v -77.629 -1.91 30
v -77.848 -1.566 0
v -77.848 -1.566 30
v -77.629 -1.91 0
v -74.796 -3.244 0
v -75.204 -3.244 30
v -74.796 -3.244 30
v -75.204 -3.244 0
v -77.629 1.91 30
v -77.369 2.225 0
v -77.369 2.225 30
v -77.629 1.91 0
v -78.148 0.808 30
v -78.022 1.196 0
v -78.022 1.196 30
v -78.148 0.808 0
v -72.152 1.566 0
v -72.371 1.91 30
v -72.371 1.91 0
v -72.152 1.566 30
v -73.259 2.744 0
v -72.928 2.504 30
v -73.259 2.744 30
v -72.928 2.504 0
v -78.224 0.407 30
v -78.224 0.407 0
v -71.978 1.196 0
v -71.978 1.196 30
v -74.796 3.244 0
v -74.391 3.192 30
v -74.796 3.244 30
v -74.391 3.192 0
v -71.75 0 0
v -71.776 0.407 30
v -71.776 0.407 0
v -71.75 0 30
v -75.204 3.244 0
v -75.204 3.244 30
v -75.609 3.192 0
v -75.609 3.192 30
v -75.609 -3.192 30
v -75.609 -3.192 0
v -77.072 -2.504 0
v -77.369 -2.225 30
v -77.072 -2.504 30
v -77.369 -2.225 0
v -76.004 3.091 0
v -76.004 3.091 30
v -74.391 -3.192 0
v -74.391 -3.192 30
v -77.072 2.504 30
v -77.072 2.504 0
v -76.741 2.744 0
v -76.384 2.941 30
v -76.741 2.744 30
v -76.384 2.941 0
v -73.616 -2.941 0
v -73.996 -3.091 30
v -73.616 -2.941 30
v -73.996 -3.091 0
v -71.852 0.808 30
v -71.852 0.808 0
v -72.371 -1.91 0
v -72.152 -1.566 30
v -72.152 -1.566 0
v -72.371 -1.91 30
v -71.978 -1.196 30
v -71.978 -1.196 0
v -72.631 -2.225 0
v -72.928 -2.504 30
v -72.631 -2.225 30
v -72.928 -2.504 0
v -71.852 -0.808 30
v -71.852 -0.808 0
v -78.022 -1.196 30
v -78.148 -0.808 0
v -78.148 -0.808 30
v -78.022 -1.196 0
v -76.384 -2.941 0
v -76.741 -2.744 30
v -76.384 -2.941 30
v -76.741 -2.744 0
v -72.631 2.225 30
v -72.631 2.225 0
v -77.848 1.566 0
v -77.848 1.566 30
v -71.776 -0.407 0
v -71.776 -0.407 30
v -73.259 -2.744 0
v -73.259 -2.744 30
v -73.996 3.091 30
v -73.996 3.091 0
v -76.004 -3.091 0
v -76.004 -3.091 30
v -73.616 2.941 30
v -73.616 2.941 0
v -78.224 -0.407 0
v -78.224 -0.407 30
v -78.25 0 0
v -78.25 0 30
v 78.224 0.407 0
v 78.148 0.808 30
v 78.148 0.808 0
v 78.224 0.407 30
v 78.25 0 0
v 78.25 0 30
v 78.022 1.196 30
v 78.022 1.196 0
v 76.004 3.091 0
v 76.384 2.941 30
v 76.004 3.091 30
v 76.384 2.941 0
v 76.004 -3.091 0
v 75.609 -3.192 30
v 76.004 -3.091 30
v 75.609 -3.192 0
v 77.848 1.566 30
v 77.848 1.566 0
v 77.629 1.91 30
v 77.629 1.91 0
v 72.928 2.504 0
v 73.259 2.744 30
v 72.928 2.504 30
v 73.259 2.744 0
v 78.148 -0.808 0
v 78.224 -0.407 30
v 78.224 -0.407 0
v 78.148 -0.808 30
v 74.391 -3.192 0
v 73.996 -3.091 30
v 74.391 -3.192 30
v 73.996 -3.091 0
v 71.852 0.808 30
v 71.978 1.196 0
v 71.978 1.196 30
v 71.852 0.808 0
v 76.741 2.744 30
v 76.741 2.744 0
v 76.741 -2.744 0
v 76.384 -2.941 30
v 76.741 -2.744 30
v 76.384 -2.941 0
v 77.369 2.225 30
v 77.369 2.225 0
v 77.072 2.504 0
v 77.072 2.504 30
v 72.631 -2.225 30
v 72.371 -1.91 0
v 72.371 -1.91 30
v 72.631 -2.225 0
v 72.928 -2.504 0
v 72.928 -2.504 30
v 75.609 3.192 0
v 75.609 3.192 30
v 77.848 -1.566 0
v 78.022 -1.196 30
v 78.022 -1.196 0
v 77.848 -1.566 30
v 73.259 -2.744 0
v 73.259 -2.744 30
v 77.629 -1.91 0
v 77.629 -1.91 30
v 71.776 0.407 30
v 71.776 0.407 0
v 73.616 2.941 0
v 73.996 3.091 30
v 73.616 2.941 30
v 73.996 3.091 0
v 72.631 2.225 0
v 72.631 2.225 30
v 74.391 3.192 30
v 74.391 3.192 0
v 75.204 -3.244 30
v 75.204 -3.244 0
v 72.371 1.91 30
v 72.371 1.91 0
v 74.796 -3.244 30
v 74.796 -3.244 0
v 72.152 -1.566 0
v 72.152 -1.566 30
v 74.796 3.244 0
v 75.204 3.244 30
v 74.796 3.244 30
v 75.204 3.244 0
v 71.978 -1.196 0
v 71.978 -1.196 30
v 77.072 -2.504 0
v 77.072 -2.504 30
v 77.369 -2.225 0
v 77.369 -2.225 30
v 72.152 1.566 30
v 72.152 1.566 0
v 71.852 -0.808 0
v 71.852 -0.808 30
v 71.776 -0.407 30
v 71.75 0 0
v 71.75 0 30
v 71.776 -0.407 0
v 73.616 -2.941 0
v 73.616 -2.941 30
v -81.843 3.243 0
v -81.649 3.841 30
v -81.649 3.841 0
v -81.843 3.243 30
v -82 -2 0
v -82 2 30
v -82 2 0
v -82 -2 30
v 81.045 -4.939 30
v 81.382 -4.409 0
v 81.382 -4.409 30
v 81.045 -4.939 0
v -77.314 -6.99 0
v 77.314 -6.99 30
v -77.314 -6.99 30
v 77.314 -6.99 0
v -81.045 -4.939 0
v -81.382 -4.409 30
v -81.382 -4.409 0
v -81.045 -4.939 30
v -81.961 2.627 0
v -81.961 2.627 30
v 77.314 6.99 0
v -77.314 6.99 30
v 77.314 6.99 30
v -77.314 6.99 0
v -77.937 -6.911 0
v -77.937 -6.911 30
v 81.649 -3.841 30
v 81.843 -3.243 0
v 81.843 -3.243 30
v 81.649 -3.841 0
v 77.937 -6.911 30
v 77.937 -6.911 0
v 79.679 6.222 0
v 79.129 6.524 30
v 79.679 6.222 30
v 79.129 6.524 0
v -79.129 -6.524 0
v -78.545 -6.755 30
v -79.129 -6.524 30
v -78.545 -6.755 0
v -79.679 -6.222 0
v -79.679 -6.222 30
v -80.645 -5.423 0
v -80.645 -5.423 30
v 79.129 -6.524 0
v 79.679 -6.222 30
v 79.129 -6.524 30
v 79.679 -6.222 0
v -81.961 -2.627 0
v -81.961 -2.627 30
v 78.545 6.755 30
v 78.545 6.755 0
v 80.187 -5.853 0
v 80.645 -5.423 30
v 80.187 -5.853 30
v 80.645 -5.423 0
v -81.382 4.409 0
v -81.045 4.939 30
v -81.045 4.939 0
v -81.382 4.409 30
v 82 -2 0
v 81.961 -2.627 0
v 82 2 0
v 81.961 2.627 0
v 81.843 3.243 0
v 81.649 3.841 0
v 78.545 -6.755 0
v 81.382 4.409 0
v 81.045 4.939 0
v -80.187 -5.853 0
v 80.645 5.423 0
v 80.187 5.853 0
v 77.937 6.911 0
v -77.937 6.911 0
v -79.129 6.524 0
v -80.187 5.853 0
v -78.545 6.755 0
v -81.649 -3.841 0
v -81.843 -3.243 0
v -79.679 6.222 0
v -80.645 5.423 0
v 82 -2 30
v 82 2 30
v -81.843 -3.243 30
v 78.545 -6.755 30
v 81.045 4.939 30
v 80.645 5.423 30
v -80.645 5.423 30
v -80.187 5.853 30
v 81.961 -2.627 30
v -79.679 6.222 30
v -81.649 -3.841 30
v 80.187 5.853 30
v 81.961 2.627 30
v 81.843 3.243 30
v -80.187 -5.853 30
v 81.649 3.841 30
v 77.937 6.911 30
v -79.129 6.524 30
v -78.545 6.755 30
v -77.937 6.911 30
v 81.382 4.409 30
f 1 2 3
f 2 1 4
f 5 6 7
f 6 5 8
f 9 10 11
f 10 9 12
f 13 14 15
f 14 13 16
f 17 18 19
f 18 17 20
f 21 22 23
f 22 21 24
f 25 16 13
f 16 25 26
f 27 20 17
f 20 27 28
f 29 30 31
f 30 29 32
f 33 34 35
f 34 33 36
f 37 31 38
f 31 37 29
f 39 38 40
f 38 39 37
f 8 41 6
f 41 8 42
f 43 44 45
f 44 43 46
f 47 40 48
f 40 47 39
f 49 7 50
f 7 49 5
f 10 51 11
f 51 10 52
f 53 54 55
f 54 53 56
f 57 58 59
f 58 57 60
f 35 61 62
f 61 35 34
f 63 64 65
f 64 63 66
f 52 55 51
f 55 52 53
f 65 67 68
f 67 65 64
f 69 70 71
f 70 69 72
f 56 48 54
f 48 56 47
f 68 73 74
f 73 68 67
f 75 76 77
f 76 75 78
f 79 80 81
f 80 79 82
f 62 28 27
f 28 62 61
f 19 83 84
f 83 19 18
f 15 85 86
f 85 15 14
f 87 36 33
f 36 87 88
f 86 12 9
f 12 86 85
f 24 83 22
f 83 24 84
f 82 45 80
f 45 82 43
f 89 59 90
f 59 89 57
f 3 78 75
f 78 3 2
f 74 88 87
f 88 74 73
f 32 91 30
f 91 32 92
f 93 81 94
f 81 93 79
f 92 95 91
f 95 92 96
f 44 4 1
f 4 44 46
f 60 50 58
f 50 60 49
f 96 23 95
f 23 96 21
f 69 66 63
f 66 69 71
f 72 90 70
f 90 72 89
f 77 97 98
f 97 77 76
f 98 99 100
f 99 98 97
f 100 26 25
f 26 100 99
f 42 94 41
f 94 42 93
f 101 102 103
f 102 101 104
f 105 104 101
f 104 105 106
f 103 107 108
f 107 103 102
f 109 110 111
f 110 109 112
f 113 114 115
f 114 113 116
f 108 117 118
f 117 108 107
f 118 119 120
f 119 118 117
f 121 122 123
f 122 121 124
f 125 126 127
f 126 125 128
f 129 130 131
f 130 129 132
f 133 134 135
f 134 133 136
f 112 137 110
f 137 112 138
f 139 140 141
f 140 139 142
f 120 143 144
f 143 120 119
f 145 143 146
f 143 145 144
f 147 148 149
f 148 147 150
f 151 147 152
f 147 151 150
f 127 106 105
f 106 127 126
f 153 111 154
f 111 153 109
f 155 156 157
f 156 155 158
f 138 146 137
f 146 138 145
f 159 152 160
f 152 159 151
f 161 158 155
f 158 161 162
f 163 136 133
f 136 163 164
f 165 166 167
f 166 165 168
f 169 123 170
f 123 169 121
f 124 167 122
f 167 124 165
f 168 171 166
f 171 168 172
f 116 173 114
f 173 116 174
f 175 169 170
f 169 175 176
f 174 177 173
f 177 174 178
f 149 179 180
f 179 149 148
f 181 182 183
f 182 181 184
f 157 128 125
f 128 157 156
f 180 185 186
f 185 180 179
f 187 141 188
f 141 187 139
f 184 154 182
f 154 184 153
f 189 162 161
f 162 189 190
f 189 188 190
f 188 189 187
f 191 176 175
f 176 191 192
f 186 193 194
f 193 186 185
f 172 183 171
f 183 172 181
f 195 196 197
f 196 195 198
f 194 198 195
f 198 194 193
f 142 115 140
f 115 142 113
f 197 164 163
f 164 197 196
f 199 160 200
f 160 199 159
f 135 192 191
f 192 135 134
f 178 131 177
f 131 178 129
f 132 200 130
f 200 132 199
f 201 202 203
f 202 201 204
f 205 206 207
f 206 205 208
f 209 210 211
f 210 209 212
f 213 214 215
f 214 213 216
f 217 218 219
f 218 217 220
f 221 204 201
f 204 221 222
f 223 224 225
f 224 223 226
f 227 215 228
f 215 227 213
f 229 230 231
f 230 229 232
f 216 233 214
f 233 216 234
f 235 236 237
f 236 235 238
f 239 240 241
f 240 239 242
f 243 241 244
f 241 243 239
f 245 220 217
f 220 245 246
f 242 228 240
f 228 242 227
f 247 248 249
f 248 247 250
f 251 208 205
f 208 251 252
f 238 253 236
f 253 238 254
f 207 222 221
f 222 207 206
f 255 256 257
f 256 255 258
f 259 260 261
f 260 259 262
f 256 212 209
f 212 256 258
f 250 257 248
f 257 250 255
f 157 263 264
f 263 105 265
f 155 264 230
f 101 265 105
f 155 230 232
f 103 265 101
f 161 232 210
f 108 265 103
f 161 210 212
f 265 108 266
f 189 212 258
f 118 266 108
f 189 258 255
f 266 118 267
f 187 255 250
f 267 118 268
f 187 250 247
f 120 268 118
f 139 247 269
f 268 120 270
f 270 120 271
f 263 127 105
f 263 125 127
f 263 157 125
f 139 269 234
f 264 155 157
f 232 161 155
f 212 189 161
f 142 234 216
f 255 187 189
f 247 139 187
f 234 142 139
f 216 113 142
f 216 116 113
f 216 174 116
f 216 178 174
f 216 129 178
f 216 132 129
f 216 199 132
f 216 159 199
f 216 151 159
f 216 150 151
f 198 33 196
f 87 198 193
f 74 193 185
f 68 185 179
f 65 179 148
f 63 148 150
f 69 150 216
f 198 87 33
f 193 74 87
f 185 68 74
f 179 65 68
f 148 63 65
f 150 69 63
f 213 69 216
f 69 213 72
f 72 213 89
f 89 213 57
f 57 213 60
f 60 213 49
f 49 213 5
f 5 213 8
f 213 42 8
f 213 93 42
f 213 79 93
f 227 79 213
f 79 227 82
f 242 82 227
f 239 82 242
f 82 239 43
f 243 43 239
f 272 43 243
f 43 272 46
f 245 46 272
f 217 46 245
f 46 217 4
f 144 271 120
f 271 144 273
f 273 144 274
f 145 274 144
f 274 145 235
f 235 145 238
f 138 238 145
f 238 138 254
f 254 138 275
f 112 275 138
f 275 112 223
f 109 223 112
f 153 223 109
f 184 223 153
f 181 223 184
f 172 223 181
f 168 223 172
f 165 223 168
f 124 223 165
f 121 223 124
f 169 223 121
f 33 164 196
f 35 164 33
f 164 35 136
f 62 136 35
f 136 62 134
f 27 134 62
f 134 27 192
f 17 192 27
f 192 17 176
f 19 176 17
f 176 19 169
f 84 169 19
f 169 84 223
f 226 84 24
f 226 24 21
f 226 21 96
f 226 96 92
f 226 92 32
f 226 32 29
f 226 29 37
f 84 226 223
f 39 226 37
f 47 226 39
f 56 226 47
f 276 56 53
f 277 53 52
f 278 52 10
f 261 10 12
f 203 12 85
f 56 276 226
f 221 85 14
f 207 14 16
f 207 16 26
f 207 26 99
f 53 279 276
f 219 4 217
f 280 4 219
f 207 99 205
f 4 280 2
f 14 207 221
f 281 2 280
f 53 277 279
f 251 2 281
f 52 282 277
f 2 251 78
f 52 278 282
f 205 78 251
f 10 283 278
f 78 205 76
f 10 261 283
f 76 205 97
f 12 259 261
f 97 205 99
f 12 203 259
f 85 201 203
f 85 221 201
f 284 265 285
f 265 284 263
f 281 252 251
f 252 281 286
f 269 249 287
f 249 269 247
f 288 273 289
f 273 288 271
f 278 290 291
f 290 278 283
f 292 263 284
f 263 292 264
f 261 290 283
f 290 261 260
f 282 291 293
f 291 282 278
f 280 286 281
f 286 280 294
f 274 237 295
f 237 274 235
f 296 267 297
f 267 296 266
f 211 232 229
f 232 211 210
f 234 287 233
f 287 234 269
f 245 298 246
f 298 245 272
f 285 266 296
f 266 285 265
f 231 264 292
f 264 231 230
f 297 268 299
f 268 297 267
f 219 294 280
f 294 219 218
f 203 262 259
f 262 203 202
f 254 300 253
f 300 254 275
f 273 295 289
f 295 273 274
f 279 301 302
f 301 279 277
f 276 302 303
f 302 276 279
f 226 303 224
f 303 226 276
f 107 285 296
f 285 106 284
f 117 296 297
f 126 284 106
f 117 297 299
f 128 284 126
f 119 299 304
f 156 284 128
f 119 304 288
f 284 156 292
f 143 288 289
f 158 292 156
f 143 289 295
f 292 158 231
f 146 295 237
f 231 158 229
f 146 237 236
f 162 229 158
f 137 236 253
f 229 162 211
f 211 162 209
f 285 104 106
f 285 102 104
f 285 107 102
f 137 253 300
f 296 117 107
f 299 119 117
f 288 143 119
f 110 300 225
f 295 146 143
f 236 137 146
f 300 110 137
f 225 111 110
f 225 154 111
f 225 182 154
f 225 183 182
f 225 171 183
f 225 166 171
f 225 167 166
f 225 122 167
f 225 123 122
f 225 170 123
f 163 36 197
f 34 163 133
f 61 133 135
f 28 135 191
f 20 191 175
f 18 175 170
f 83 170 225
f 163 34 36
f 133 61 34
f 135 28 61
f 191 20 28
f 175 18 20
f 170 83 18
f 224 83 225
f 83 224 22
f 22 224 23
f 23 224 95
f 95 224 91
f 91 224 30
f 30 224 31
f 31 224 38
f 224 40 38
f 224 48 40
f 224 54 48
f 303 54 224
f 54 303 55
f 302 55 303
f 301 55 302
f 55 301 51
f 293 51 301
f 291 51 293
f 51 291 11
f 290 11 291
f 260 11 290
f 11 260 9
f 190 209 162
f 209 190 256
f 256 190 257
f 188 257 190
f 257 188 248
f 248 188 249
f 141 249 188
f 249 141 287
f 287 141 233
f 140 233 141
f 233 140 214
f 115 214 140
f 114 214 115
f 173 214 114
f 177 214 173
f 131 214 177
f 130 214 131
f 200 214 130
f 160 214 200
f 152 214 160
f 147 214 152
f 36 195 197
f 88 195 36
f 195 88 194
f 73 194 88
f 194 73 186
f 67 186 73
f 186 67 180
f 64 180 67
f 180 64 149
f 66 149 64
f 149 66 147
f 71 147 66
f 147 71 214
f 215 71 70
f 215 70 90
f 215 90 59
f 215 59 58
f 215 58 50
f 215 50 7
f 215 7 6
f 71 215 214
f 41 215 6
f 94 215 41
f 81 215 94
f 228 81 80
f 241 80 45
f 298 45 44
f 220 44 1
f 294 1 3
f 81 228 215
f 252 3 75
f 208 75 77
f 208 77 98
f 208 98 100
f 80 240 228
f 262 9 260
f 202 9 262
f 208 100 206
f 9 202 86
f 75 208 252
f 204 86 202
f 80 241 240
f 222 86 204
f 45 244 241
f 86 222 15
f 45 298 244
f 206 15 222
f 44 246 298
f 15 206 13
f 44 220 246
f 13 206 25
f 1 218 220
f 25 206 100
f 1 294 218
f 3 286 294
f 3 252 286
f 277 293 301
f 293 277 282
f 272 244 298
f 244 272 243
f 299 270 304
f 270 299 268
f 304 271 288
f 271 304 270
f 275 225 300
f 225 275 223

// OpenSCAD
$fn = 50;


difference() {
	union() {
		hull() {
			translate(v = [-77.0000000000, 2.0000000000, 0]) {
				cylinder(h = 30, r = 5);
			}
			translate(v = [77.0000000000, 2.0000000000, 0]) {
				cylinder(h = 30, r = 5);
			}
			translate(v = [-77.0000000000, -2.0000000000, 0]) {
				cylinder(h = 30, r = 5);
			}
			translate(v = [77.0000000000, -2.0000000000, 0]) {
				cylinder(h = 30, r = 5);
			}
		}
	}
	union() {
		translate(v = [-75.0000000000, 0.0000000000, -100.0000000000]) {
			cylinder(h = 200, r = 3.2500000000);
		}
		translate(v = [-75.0000000000, 0.0000000000, -100.0000000000]) {
			cylinder(h = 200, r = 3.2500000000);
		}
		translate(v = [75.0000000000, 0.0000000000, -100.0000000000]) {
			cylinder(h = 200, r = 3.2500000000);
		}
		translate(v = [75.0000000000, 0.0000000000, -100.0000000000]) {
			cylinder(h = 200, r = 3.2500000000);
		}
	}
}
